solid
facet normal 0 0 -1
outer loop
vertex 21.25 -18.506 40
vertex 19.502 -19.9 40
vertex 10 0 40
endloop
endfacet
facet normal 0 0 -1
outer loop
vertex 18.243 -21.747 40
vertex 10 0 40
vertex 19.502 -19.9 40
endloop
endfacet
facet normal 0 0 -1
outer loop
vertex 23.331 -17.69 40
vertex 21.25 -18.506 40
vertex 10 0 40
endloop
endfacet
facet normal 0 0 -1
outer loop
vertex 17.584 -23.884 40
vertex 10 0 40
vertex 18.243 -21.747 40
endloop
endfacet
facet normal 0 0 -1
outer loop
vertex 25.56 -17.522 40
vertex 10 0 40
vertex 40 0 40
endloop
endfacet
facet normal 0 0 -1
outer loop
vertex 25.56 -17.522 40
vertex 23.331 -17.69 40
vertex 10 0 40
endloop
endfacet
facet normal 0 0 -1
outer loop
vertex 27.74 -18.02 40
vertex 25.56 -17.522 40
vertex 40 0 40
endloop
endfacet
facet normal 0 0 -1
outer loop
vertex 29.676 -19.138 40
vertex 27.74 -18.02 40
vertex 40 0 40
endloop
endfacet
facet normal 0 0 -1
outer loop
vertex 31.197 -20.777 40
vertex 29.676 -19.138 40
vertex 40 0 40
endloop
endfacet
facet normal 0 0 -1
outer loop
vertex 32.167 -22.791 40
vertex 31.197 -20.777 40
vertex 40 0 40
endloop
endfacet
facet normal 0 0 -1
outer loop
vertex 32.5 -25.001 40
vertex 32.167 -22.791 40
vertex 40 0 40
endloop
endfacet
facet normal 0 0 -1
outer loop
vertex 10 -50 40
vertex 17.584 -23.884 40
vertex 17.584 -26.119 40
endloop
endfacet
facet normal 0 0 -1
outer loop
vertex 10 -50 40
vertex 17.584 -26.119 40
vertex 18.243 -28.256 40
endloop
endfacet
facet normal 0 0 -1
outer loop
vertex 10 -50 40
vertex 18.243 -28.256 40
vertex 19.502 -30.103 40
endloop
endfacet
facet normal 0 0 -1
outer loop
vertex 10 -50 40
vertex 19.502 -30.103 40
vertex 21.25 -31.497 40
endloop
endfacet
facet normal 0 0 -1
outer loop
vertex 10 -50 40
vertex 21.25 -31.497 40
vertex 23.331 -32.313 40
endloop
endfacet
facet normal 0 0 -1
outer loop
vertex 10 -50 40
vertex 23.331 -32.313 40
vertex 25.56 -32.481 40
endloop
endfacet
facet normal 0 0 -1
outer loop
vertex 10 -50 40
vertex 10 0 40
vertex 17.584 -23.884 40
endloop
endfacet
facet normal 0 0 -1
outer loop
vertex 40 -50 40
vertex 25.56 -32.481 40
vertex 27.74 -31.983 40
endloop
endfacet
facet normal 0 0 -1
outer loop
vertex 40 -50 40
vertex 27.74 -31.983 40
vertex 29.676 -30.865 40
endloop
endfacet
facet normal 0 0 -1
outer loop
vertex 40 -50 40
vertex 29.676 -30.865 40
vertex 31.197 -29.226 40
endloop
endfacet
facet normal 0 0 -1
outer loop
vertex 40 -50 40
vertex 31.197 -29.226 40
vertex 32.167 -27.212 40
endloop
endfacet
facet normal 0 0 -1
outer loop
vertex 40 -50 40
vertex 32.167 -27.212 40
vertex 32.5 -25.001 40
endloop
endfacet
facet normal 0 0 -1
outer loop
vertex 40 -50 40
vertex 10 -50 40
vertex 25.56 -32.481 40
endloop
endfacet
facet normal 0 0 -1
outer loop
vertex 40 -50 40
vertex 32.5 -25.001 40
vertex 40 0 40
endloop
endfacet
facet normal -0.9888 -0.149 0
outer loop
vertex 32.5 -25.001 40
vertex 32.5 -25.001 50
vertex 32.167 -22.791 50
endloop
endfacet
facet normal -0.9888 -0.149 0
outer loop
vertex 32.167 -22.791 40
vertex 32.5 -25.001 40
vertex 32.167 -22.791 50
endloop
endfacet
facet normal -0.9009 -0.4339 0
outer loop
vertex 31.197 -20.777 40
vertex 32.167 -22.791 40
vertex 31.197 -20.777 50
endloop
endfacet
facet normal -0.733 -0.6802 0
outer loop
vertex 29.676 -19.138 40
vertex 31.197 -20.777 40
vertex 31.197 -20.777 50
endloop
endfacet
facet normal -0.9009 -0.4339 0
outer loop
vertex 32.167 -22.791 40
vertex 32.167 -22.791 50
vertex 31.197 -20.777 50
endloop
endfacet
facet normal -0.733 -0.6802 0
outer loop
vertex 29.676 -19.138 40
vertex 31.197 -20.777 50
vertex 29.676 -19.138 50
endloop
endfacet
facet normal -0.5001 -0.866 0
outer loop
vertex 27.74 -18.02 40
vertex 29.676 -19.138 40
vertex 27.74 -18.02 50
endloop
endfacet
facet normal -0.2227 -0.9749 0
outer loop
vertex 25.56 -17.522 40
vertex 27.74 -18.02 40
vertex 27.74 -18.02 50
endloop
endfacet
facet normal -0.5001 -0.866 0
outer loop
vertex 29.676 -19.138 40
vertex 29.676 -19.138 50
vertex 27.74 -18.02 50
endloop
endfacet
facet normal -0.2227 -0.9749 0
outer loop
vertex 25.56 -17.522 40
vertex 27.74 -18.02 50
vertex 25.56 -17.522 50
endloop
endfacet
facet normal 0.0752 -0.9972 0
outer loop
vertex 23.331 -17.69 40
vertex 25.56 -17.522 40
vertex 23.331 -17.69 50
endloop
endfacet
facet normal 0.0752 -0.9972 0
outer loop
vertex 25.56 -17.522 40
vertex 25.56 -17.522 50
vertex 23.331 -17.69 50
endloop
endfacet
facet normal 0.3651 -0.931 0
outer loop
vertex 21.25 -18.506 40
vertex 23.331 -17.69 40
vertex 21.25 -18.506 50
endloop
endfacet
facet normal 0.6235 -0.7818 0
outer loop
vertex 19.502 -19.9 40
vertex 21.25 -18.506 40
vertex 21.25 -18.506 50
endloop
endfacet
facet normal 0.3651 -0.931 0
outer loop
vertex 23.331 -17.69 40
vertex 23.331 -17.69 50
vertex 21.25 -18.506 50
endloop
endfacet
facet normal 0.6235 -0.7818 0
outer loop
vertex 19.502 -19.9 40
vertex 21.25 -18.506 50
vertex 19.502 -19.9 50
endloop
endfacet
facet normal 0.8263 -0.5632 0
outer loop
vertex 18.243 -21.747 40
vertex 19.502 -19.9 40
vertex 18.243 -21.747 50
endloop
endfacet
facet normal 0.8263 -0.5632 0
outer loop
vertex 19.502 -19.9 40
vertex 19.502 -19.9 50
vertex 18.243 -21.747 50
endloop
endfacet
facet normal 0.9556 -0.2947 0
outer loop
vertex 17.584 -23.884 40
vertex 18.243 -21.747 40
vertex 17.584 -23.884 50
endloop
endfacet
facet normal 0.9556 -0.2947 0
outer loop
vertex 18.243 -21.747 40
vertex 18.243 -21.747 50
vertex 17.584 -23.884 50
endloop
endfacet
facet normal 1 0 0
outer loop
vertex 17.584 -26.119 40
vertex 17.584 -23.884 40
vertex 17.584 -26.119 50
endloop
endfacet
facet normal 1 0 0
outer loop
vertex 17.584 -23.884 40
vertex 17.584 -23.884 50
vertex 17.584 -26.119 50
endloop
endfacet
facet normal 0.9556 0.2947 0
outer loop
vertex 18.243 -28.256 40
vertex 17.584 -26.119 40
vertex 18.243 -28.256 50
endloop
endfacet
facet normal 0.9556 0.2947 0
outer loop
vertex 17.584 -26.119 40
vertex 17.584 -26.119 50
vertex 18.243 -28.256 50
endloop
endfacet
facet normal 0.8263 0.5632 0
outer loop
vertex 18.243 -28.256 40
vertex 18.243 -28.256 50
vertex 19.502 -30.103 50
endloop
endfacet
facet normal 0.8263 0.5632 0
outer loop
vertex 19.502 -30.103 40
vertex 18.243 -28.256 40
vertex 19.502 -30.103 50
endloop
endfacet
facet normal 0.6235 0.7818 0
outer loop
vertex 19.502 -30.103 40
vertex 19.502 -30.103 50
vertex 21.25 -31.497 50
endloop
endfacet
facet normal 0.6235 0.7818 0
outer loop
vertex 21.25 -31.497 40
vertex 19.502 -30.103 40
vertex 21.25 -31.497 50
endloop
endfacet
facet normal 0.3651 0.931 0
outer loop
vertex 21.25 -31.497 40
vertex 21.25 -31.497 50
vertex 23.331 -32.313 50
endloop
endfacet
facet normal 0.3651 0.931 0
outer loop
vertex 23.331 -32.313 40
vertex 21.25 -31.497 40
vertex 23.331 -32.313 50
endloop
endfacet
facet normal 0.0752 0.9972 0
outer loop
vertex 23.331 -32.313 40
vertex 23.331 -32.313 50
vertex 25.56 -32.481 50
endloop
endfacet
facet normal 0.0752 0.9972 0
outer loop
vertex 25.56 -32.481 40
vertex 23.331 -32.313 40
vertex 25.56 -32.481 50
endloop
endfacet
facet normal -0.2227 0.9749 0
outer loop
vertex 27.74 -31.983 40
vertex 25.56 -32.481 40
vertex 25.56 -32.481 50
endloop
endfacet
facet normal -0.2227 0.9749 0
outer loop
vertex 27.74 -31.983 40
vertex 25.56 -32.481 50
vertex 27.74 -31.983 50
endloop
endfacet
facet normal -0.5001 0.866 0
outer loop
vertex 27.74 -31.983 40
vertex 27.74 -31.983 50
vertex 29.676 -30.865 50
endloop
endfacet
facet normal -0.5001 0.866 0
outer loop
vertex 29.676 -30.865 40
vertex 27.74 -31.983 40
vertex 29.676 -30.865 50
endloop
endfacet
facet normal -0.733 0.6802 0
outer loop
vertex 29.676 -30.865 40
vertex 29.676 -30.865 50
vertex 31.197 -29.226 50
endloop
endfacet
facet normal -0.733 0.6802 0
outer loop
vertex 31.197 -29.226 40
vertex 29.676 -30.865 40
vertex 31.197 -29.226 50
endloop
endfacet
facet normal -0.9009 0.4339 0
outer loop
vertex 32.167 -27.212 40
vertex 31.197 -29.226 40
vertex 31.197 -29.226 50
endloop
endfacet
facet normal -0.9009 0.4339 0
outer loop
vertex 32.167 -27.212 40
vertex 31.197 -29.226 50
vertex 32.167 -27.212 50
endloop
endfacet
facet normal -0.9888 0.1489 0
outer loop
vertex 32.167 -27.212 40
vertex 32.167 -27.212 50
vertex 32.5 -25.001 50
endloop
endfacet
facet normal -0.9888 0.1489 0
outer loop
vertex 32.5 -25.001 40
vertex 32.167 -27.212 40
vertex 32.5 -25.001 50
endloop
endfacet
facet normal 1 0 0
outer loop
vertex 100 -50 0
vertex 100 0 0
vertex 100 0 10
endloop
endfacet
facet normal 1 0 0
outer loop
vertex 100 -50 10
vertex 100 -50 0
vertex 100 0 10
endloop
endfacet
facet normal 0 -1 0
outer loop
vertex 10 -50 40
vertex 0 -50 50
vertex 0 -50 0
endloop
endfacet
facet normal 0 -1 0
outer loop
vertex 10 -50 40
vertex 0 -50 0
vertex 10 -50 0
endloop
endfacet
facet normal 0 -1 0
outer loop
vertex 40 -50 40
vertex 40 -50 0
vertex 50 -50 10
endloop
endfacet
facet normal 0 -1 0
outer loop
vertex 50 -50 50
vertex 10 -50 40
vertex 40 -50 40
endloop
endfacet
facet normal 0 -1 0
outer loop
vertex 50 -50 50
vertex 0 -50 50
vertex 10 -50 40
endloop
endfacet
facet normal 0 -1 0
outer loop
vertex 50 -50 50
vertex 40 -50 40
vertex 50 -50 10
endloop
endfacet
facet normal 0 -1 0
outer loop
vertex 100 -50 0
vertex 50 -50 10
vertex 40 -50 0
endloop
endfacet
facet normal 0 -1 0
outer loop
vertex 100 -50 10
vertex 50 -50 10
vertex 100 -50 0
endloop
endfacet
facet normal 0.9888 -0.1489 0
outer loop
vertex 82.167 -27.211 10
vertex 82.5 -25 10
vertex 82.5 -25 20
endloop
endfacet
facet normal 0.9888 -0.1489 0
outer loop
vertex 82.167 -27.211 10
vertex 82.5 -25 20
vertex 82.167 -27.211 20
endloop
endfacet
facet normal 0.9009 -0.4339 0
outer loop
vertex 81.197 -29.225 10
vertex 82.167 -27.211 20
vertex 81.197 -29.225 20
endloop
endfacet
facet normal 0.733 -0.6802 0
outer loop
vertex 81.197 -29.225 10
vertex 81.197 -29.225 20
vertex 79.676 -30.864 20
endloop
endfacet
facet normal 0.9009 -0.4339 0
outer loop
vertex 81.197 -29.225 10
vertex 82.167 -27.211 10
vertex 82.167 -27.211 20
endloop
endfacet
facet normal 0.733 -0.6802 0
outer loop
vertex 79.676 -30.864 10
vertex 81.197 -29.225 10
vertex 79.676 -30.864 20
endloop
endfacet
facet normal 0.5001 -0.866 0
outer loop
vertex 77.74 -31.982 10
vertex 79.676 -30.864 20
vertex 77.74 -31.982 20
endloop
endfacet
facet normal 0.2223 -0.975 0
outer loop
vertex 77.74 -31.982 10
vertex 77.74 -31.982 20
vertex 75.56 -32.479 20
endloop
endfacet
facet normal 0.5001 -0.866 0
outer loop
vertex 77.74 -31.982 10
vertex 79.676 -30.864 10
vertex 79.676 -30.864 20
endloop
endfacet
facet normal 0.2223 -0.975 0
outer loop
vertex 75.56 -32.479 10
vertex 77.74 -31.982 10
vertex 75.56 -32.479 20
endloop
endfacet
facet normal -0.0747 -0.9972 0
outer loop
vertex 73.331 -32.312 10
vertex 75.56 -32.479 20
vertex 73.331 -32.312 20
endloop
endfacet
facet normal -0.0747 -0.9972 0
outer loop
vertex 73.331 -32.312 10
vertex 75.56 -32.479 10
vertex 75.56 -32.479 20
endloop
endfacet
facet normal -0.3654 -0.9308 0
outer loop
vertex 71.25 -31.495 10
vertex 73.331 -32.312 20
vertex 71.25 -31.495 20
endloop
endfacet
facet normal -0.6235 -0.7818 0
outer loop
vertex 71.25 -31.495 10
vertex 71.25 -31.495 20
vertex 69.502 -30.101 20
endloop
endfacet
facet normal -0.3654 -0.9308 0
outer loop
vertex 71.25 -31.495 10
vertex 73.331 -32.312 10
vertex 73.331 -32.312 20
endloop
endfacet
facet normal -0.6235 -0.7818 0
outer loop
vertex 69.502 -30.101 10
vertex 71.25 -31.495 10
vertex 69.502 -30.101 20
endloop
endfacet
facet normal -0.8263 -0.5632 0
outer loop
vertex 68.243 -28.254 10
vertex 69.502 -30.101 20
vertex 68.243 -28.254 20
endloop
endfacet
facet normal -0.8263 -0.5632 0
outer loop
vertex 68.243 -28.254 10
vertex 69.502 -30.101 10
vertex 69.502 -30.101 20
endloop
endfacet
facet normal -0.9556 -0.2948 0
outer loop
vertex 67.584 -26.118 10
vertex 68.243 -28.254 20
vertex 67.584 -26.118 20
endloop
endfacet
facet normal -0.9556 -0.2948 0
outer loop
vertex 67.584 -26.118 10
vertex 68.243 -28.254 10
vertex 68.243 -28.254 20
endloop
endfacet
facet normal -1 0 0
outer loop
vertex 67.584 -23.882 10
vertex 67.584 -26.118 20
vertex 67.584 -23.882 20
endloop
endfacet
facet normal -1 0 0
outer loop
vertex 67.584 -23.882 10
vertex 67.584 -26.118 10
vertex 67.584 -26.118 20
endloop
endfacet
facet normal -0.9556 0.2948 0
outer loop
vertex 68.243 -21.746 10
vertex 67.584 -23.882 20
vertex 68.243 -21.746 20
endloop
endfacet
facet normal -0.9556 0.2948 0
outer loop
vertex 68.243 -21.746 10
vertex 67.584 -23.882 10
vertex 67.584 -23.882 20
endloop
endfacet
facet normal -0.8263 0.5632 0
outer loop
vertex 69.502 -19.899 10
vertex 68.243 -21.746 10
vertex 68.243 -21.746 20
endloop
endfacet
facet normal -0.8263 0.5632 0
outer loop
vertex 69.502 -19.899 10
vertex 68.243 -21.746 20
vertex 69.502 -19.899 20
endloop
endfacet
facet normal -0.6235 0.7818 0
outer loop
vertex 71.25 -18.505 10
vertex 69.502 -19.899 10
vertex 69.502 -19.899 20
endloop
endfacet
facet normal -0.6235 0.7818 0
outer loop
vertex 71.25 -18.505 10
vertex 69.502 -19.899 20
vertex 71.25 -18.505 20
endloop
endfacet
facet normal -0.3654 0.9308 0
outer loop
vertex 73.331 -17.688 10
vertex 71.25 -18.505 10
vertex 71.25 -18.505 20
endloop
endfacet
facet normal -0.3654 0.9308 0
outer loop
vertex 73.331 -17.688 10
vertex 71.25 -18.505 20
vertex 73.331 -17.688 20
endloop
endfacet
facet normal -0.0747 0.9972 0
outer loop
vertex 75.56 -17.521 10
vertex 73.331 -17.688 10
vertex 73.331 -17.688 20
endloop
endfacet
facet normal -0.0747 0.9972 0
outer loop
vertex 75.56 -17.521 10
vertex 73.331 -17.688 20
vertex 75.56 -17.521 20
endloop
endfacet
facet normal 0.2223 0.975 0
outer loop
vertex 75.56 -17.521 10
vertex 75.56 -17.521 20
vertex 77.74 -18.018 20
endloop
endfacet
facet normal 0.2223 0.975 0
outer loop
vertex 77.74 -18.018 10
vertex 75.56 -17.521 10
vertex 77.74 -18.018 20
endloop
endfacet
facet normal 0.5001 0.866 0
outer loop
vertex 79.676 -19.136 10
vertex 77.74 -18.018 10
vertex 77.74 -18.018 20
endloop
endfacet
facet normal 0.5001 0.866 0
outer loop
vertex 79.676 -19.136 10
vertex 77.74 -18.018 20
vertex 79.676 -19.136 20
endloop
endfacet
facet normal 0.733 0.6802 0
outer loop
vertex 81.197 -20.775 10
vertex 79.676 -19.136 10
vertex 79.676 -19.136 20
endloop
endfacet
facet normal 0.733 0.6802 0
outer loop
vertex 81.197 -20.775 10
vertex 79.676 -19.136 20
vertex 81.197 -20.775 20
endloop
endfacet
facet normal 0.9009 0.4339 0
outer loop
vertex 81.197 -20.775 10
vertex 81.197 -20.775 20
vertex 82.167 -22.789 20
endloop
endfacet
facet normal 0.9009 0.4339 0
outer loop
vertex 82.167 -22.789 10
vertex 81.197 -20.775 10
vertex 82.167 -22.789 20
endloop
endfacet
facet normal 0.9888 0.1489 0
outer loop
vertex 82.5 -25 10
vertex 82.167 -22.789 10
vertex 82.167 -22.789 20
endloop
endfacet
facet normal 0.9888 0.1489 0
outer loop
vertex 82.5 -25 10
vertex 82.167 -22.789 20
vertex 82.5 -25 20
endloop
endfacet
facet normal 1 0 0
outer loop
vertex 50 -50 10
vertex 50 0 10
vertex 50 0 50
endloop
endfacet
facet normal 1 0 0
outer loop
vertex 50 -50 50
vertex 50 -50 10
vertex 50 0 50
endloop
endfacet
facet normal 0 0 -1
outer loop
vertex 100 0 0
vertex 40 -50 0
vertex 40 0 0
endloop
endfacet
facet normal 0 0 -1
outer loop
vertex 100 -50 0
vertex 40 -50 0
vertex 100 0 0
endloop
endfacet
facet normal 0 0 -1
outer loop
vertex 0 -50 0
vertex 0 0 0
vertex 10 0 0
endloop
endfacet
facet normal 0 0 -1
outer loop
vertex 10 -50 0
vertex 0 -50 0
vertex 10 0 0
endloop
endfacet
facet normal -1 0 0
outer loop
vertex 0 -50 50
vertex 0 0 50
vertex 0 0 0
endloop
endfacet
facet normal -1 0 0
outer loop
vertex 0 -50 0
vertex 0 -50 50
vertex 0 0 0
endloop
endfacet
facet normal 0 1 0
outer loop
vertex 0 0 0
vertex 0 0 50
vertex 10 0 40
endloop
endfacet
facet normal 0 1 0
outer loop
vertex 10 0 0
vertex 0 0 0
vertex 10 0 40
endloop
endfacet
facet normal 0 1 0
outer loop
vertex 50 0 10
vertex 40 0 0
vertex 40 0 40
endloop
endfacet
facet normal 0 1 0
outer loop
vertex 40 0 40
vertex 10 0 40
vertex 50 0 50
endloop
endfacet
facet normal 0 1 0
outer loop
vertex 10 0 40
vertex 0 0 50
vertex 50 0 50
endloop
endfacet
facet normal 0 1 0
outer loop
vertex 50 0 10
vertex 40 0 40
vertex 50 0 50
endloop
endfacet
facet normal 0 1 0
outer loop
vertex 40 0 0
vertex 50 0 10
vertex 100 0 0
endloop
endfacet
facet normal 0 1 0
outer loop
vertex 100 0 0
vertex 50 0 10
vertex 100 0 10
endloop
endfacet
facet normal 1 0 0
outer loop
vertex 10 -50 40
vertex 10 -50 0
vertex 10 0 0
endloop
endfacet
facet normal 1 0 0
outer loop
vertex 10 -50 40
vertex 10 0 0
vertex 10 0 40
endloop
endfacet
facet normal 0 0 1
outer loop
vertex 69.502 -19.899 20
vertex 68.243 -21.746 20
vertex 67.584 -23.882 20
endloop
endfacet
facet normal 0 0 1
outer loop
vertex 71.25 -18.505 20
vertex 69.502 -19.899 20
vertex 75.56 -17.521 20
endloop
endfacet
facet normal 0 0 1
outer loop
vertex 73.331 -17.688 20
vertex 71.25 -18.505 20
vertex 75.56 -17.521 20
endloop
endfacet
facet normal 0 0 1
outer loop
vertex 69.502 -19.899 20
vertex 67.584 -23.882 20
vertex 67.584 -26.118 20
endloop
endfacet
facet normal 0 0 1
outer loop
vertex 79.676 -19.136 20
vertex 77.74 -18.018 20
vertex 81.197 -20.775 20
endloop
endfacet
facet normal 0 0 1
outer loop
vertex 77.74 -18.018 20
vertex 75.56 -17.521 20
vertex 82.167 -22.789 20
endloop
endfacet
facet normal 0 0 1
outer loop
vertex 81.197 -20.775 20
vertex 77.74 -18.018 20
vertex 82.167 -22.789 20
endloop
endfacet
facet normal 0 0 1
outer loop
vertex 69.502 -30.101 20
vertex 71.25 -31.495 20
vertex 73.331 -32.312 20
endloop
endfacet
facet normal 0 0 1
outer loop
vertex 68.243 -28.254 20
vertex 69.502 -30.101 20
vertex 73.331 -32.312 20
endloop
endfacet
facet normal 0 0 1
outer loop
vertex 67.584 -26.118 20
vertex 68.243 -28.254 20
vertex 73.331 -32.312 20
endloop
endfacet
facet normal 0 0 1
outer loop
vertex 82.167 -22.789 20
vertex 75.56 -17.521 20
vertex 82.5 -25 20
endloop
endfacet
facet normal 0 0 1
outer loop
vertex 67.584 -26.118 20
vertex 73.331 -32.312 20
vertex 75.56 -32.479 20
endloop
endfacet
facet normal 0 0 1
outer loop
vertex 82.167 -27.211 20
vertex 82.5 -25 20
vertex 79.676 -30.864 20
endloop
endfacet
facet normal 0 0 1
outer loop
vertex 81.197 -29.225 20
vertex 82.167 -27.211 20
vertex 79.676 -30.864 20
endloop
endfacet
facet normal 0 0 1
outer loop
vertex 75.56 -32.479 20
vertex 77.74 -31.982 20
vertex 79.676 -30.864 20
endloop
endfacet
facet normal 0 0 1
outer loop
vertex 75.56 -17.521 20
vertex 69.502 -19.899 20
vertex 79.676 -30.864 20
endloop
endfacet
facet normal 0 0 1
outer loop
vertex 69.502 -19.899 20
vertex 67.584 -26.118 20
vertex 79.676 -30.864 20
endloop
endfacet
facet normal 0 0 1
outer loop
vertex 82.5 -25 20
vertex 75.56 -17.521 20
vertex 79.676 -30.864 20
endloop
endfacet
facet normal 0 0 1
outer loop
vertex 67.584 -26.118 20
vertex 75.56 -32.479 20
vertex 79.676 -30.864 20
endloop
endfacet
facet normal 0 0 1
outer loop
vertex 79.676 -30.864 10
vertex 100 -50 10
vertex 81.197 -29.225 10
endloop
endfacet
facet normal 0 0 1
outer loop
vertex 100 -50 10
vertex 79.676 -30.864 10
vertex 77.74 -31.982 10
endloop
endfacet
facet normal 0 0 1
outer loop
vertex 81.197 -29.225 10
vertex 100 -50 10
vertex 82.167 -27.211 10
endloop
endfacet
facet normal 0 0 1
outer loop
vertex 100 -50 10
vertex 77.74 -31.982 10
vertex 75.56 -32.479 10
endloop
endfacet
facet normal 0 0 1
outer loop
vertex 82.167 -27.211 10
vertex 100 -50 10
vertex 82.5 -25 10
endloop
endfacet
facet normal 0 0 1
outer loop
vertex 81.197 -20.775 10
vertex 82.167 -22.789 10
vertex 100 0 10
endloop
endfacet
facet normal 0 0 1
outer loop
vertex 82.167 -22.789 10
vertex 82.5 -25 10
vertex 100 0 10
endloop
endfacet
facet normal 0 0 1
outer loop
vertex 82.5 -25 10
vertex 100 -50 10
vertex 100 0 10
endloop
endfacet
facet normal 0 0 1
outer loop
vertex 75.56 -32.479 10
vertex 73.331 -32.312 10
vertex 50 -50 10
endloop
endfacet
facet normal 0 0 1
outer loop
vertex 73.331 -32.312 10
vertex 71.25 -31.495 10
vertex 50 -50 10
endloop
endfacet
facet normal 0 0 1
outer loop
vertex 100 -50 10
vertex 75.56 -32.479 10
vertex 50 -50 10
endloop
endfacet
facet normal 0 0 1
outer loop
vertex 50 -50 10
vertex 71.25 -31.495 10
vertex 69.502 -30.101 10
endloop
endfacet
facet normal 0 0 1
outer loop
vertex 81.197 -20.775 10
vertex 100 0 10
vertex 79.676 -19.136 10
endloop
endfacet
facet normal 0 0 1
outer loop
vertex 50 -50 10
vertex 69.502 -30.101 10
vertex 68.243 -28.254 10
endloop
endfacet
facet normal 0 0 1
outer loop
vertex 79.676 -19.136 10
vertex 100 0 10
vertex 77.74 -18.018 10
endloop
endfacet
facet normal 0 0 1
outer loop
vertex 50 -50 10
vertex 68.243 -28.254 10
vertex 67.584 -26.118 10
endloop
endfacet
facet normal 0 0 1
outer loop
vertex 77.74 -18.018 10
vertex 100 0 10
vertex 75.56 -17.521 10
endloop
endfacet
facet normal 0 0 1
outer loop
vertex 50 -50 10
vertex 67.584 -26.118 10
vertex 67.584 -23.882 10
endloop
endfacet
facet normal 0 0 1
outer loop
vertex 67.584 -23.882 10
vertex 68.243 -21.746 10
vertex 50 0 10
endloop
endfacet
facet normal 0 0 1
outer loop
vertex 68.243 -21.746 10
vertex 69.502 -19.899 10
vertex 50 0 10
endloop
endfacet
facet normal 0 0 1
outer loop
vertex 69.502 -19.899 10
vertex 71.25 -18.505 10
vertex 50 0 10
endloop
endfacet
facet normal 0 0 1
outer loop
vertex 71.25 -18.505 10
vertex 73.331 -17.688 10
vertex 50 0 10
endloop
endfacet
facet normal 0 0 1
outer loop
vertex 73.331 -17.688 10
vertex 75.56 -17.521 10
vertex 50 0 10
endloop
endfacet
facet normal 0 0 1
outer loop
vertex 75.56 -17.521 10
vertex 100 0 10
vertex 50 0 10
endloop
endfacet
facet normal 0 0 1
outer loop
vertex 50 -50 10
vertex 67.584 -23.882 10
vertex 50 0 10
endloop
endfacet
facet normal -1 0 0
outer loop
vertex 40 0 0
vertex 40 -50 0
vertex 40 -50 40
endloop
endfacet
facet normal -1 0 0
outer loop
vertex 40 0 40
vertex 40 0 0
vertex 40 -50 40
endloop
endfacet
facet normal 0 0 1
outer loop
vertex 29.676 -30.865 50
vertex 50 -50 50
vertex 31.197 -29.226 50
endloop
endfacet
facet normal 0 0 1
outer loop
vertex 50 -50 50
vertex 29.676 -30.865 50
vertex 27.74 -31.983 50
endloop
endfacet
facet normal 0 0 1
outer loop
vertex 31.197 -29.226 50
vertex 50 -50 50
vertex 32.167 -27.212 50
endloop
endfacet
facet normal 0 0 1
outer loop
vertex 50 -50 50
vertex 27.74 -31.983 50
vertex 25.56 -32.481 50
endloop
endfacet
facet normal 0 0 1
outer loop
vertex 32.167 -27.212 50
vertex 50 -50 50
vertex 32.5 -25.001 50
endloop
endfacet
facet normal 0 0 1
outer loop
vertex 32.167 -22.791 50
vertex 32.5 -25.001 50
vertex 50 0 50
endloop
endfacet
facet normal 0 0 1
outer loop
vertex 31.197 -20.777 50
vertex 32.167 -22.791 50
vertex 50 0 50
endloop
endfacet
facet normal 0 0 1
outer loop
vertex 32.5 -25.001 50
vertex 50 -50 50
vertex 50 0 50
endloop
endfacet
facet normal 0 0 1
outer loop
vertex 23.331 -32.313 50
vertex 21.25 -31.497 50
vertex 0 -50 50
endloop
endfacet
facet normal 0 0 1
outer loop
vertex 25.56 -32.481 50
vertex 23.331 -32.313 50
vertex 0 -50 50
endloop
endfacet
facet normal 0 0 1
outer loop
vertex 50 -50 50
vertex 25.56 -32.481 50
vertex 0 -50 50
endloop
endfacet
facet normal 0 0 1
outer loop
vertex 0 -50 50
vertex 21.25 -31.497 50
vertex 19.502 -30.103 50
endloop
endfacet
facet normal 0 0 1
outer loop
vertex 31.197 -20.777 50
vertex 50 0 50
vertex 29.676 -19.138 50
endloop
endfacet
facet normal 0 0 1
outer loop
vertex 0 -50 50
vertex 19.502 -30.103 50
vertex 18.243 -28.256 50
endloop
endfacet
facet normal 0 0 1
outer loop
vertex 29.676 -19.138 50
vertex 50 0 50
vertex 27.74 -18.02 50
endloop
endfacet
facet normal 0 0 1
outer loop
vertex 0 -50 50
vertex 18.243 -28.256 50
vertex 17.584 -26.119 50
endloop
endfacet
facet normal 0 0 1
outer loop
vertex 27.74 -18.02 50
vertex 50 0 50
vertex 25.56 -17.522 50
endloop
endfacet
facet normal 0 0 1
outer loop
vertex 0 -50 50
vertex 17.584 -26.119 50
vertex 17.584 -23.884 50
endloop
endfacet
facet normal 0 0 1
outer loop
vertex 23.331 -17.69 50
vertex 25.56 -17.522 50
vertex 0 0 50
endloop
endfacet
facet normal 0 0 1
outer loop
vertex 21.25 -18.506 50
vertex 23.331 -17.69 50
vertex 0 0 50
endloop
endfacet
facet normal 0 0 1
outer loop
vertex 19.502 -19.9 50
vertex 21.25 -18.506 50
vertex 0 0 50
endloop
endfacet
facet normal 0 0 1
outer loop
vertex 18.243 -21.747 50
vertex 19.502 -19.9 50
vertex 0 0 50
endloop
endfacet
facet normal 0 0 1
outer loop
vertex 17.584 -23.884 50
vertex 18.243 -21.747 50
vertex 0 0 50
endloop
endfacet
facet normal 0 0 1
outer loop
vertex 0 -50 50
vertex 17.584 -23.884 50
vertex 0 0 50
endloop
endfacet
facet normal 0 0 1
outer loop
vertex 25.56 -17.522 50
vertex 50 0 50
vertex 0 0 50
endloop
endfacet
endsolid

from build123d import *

# Parameters (mm, degrees)
F1_DEPTH = 50
F2_W     = 30
F2_H     = 40
F3_DEPTH = 50.001
F4_R     = 7.5
F5_DEPTH = 50.001
F6_R     = 7.5
F7_DEPTH = 20


with BuildPart() as f1:
    # F0 (on Front) → F1 (new body)
    with BuildSketch(Plane.XZ):
        Polygon((0, 50), (0, 0), (100, 0), (100, 10), (50, 10), (50, 50), align=None)
    extrude(amount=F1_DEPTH)

    # F2 (on face) → F3 (cut, through all)
    with BuildSketch(Plane.XZ.offset(50)):
        with Locations((25, 20)):
            Rectangle(F2_W, F2_H)
    extrude(amount=-F3_DEPTH, mode=Mode.SUBTRACT)

    # F4 (on face) → F5 (cut, through all)
    with BuildSketch(Plane.XY.offset(50)):
        with Locations((25, -25.001487)):
            Circle(F4_R)
    extrude(amount=-F5_DEPTH, mode=Mode.SUBTRACT)

    # F6 (on face) → F7 (join)
    with BuildSketch(Plane(origin=(0, 0, 0), x_dir=(1, 0, 0), z_dir=(0, 0, -1))):
        with Locations((75, 25)):
            Circle(F6_R)
    extrude(amount=-F7_DEPTH)


solid = f1.part
